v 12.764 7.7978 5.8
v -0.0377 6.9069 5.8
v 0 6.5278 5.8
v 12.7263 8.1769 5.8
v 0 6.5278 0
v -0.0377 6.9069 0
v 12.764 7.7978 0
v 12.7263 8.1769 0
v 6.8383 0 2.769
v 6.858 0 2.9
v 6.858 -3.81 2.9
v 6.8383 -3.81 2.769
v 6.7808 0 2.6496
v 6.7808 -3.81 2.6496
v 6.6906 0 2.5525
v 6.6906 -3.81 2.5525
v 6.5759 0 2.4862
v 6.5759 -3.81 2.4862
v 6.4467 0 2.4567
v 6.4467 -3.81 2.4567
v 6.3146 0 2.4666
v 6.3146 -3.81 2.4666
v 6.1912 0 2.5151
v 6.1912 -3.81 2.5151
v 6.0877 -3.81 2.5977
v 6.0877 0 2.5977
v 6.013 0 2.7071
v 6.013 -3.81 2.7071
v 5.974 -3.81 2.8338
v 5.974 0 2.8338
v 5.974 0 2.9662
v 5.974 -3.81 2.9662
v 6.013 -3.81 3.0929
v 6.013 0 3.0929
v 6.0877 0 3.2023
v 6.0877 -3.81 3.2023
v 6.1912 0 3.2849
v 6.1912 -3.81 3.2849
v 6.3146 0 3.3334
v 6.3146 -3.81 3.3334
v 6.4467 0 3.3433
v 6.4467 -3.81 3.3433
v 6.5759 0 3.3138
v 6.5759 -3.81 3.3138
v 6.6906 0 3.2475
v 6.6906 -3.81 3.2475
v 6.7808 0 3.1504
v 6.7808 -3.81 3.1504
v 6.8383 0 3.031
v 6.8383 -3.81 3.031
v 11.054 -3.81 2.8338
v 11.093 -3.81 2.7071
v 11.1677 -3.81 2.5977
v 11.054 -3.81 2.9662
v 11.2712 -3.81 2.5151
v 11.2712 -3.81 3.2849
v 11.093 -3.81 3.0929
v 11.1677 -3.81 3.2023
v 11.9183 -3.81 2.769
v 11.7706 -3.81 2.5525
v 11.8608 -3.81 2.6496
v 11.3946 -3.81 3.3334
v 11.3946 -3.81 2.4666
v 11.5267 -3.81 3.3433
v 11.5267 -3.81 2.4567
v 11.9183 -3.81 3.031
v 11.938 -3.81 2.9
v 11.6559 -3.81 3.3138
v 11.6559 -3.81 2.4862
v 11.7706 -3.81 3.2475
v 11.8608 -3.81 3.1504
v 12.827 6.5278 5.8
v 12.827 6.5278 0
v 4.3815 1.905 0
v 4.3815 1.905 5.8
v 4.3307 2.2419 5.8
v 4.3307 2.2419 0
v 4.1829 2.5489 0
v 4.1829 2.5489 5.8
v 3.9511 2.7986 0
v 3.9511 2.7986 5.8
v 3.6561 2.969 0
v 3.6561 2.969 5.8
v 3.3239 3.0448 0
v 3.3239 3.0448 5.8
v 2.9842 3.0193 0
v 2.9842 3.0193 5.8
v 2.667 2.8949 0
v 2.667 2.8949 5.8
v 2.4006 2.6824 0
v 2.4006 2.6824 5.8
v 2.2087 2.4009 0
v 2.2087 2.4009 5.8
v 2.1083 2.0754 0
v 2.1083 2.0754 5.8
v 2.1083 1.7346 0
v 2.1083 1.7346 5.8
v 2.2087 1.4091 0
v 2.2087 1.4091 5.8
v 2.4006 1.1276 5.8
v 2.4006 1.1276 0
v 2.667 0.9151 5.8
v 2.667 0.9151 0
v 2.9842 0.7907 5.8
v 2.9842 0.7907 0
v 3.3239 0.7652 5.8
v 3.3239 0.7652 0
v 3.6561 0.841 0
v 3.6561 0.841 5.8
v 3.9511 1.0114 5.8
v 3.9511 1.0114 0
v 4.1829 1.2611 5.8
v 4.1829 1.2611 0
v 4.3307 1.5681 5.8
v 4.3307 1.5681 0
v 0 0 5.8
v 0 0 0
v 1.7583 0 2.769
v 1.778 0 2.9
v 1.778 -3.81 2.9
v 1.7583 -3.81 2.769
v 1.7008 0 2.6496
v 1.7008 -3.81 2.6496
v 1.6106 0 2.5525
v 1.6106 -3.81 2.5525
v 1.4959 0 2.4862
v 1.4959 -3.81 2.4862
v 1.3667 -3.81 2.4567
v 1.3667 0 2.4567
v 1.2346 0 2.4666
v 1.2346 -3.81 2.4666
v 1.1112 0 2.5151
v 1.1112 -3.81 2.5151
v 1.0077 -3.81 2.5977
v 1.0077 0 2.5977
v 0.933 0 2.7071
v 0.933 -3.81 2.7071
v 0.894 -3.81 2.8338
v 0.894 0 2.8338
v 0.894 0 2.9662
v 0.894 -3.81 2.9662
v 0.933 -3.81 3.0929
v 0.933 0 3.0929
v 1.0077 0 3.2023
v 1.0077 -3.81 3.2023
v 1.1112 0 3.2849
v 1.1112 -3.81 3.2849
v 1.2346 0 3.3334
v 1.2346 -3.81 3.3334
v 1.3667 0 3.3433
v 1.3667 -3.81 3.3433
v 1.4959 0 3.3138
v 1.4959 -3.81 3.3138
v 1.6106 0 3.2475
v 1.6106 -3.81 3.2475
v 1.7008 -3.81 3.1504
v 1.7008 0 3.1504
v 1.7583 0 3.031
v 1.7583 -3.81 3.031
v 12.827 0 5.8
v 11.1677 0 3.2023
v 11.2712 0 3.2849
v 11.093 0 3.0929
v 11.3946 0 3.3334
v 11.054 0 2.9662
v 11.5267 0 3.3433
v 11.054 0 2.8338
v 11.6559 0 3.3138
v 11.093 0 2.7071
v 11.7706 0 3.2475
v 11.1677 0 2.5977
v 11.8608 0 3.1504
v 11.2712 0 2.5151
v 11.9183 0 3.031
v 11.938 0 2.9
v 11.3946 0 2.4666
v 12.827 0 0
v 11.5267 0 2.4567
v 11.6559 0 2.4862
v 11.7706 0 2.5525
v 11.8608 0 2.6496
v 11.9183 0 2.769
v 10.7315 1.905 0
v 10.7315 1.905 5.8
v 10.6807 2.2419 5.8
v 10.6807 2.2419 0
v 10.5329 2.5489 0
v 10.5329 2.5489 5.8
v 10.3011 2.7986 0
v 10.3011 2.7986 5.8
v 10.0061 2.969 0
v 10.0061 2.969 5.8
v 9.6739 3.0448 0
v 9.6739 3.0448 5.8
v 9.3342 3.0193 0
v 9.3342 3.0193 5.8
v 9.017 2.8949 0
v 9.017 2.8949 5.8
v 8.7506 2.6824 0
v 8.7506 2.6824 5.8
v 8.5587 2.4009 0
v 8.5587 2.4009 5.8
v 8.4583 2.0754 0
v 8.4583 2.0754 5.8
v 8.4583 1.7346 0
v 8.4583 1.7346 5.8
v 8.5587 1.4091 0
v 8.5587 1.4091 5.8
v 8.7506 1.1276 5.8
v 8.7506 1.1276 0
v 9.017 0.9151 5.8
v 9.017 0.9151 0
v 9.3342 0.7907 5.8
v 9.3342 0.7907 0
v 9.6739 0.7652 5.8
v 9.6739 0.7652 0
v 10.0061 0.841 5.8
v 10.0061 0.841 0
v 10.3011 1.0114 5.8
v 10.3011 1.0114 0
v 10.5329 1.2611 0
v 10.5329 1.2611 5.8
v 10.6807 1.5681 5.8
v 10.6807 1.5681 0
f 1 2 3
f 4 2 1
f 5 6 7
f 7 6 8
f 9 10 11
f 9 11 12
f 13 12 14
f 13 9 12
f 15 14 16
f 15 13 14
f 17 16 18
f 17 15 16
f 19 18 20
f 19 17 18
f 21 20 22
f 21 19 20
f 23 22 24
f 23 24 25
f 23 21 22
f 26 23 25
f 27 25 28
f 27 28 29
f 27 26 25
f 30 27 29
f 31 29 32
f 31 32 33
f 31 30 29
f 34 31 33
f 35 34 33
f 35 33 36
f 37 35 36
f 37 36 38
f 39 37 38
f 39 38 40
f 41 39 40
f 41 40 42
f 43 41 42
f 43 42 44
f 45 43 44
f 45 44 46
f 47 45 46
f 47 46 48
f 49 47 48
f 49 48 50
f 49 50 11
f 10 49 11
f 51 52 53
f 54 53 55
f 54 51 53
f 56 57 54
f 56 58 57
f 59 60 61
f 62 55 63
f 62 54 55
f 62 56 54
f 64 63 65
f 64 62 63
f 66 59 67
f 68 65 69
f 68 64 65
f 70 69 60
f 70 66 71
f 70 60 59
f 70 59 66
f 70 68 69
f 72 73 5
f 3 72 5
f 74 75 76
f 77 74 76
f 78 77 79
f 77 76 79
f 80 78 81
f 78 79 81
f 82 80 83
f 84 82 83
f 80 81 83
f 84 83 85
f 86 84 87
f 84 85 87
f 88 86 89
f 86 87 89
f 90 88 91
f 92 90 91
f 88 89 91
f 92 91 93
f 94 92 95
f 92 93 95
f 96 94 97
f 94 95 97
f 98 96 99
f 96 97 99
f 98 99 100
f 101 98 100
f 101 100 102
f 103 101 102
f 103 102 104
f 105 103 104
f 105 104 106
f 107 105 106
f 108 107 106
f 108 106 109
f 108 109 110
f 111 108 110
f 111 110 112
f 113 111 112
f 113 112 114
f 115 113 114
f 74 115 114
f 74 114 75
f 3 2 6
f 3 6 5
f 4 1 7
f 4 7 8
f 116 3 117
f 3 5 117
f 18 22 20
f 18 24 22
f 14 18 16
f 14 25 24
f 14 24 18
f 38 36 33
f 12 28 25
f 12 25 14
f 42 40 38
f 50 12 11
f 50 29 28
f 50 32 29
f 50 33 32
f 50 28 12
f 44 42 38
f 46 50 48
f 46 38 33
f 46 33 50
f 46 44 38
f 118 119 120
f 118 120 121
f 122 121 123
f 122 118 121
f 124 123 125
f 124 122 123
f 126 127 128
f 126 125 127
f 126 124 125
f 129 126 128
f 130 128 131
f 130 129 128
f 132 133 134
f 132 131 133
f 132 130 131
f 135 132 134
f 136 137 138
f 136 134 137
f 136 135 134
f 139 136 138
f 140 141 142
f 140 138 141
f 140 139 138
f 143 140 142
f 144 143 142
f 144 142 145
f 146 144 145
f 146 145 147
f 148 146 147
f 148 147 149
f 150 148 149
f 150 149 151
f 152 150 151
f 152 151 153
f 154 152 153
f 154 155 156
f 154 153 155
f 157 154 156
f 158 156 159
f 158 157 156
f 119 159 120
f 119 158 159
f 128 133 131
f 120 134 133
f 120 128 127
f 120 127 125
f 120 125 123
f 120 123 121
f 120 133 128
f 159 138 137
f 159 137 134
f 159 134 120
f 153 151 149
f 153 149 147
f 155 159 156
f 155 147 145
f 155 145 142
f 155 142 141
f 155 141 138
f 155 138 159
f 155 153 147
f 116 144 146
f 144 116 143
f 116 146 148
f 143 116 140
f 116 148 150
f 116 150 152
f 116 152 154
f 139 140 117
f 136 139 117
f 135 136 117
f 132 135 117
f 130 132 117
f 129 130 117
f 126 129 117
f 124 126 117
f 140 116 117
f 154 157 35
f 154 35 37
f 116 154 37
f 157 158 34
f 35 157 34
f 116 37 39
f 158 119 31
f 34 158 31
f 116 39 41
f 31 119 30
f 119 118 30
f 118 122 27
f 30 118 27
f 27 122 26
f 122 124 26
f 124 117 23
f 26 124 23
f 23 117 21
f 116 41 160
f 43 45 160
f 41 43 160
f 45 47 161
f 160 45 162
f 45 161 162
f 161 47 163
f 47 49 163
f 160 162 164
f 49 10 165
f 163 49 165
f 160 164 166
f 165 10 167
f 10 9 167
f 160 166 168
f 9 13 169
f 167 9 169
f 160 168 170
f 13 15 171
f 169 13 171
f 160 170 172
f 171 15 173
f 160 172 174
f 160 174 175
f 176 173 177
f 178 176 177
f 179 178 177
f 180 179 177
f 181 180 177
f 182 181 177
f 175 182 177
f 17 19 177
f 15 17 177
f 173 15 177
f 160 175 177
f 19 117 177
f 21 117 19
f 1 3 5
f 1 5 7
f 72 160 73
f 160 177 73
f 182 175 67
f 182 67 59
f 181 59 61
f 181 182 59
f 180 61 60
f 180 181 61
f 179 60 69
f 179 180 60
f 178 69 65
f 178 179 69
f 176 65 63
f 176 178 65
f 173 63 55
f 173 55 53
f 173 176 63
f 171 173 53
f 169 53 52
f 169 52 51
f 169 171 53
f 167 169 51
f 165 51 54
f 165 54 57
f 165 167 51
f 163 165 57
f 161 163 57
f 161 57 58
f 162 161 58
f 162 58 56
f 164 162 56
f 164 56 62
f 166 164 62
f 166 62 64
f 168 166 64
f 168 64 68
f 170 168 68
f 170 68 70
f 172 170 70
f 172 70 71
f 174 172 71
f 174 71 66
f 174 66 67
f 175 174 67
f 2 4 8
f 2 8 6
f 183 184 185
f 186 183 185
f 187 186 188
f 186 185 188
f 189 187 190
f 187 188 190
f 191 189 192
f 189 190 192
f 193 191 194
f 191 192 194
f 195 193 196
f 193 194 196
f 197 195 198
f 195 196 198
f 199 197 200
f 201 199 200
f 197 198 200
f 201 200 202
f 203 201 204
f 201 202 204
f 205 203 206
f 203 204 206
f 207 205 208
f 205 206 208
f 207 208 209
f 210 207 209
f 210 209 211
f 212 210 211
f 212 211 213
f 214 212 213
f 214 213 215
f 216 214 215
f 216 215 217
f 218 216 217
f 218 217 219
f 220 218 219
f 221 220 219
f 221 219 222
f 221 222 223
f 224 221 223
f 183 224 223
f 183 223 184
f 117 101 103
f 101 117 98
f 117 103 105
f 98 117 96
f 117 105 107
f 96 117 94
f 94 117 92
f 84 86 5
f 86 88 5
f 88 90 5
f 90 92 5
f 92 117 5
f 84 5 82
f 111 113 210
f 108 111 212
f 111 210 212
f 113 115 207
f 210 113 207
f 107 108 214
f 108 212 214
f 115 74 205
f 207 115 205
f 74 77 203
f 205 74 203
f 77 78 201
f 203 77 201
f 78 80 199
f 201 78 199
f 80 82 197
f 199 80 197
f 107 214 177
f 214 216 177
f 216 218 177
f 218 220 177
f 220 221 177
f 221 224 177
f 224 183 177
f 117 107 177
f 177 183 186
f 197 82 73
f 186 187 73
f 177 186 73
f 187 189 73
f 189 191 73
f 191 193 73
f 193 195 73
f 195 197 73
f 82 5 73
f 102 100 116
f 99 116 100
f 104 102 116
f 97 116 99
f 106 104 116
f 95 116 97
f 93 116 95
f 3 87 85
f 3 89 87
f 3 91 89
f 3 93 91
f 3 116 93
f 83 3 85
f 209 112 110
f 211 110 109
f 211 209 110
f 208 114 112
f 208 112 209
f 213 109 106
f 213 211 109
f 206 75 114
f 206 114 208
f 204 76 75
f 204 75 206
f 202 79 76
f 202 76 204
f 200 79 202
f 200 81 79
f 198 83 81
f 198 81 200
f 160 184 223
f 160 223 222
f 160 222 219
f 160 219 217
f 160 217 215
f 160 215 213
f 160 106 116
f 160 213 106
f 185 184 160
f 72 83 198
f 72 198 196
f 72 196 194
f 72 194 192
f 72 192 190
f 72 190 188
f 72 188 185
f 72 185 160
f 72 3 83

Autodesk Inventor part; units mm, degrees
ref_plane "YZ Plane" through (0, 0, 0) normal (1, 0, 0) x (0, 1, 0)
ref_plane "XZ Plane" through (0, 0, 0) normal (0, 1, 0) x (-1, 0, 0)
ref_plane "XY Plane" through (0, 0, 0) normal (0, 0, 1) x (1, 0, 0)
sketch "Sketch1" plane through (0, 0, 0) normal (0, 0, 1) x (1, 0, 0)
  line L0 (0, 0) -> (12.827, 0)
  line L1 (12.827, 0) -> (12.827, 6.5278)
  line L2 (12.827, 6.5278) -> (0, 6.5278)
  line L3 (0, 6.5278) -> (0, 0)
  dimension "d0" = 12.827
  dimension "d2" = 6.5278
extrude "Extrusion1" add sketch "Sketch1" along normal blind 5.8
sketch "Sketch2" plane through (0, 0, 5.8) normal (0, 0, 1) x (1, 0, 0)
  line L0 (12.827, 6.5278) -> (0, 6.5278) projected
  line L1 (0, 6.5278) -> (12.764, 7.7978)
  line L2 (12.764, 7.7978) -> (12.7263, 8.1769)
  line L3 (12.7263, 8.1769) -> (-0.0377, 6.9069)
  line L4 (-0.0377, 6.9069) -> (0, 6.5278)
  dimension "d5" = 0.381
  dimension "d7" = 1.27
extrude "Extrusion2" add sketch "Sketch2" against normal up to surface (5.8 mm away)
sketch "Sketch3" plane through (0, 0, 0) normal (0, -1, 0) x (1, 0, 0)
  line L0 (12.827, 0) -> (12.827, 5.8) projected
  line L1 (0, 5.8) -> (12.827, 5.8) projected
  line L2 (0, 0) -> (0, 5.8) projected
  line L3 (1.3335, 2.9) -> (11.4935, 2.9)
  circle A0 centre (1.3335, 2.9) radius 0.4445
  circle A1 centre (6.4135, 2.9) radius 0.4445
  circle A2 centre (11.4935, 2.9) radius 0.4445
  point P0 (6.4135, 5.8)
  point P1 (12.827, 2.9)
  dimension "d10" = 10.16
  dimension "d12" = 0.889
extrude "Extrusion3" add sketch "Sketch3" along normal blind 3.81
sketch "Sketch4" plane through (0, 0, 5.8) normal (0, 0, 1) x (1, 0, 0)
  line L0 (0, 0) -> (12.827, 0) projected
  line L1 (0, 6.5278) -> (0, 0) projected
  line L2 (3.2385, 1.905) -> (9.5885, 1.905)
  circle A0 centre (3.2385, 1.905) radius 1.143
  circle A1 centre (9.5885, 1.905) radius 1.143
  point P0 (6.4135, 1.905)
  point P1 (6.4135, 0)
  dimension "d15" = 6.35
  dimension "d17" = 1.905
  dimension "d18" = 2.286
extrude "Extrusion4" cut sketch "Sketch4" against normal through all
properties part number "switch"
